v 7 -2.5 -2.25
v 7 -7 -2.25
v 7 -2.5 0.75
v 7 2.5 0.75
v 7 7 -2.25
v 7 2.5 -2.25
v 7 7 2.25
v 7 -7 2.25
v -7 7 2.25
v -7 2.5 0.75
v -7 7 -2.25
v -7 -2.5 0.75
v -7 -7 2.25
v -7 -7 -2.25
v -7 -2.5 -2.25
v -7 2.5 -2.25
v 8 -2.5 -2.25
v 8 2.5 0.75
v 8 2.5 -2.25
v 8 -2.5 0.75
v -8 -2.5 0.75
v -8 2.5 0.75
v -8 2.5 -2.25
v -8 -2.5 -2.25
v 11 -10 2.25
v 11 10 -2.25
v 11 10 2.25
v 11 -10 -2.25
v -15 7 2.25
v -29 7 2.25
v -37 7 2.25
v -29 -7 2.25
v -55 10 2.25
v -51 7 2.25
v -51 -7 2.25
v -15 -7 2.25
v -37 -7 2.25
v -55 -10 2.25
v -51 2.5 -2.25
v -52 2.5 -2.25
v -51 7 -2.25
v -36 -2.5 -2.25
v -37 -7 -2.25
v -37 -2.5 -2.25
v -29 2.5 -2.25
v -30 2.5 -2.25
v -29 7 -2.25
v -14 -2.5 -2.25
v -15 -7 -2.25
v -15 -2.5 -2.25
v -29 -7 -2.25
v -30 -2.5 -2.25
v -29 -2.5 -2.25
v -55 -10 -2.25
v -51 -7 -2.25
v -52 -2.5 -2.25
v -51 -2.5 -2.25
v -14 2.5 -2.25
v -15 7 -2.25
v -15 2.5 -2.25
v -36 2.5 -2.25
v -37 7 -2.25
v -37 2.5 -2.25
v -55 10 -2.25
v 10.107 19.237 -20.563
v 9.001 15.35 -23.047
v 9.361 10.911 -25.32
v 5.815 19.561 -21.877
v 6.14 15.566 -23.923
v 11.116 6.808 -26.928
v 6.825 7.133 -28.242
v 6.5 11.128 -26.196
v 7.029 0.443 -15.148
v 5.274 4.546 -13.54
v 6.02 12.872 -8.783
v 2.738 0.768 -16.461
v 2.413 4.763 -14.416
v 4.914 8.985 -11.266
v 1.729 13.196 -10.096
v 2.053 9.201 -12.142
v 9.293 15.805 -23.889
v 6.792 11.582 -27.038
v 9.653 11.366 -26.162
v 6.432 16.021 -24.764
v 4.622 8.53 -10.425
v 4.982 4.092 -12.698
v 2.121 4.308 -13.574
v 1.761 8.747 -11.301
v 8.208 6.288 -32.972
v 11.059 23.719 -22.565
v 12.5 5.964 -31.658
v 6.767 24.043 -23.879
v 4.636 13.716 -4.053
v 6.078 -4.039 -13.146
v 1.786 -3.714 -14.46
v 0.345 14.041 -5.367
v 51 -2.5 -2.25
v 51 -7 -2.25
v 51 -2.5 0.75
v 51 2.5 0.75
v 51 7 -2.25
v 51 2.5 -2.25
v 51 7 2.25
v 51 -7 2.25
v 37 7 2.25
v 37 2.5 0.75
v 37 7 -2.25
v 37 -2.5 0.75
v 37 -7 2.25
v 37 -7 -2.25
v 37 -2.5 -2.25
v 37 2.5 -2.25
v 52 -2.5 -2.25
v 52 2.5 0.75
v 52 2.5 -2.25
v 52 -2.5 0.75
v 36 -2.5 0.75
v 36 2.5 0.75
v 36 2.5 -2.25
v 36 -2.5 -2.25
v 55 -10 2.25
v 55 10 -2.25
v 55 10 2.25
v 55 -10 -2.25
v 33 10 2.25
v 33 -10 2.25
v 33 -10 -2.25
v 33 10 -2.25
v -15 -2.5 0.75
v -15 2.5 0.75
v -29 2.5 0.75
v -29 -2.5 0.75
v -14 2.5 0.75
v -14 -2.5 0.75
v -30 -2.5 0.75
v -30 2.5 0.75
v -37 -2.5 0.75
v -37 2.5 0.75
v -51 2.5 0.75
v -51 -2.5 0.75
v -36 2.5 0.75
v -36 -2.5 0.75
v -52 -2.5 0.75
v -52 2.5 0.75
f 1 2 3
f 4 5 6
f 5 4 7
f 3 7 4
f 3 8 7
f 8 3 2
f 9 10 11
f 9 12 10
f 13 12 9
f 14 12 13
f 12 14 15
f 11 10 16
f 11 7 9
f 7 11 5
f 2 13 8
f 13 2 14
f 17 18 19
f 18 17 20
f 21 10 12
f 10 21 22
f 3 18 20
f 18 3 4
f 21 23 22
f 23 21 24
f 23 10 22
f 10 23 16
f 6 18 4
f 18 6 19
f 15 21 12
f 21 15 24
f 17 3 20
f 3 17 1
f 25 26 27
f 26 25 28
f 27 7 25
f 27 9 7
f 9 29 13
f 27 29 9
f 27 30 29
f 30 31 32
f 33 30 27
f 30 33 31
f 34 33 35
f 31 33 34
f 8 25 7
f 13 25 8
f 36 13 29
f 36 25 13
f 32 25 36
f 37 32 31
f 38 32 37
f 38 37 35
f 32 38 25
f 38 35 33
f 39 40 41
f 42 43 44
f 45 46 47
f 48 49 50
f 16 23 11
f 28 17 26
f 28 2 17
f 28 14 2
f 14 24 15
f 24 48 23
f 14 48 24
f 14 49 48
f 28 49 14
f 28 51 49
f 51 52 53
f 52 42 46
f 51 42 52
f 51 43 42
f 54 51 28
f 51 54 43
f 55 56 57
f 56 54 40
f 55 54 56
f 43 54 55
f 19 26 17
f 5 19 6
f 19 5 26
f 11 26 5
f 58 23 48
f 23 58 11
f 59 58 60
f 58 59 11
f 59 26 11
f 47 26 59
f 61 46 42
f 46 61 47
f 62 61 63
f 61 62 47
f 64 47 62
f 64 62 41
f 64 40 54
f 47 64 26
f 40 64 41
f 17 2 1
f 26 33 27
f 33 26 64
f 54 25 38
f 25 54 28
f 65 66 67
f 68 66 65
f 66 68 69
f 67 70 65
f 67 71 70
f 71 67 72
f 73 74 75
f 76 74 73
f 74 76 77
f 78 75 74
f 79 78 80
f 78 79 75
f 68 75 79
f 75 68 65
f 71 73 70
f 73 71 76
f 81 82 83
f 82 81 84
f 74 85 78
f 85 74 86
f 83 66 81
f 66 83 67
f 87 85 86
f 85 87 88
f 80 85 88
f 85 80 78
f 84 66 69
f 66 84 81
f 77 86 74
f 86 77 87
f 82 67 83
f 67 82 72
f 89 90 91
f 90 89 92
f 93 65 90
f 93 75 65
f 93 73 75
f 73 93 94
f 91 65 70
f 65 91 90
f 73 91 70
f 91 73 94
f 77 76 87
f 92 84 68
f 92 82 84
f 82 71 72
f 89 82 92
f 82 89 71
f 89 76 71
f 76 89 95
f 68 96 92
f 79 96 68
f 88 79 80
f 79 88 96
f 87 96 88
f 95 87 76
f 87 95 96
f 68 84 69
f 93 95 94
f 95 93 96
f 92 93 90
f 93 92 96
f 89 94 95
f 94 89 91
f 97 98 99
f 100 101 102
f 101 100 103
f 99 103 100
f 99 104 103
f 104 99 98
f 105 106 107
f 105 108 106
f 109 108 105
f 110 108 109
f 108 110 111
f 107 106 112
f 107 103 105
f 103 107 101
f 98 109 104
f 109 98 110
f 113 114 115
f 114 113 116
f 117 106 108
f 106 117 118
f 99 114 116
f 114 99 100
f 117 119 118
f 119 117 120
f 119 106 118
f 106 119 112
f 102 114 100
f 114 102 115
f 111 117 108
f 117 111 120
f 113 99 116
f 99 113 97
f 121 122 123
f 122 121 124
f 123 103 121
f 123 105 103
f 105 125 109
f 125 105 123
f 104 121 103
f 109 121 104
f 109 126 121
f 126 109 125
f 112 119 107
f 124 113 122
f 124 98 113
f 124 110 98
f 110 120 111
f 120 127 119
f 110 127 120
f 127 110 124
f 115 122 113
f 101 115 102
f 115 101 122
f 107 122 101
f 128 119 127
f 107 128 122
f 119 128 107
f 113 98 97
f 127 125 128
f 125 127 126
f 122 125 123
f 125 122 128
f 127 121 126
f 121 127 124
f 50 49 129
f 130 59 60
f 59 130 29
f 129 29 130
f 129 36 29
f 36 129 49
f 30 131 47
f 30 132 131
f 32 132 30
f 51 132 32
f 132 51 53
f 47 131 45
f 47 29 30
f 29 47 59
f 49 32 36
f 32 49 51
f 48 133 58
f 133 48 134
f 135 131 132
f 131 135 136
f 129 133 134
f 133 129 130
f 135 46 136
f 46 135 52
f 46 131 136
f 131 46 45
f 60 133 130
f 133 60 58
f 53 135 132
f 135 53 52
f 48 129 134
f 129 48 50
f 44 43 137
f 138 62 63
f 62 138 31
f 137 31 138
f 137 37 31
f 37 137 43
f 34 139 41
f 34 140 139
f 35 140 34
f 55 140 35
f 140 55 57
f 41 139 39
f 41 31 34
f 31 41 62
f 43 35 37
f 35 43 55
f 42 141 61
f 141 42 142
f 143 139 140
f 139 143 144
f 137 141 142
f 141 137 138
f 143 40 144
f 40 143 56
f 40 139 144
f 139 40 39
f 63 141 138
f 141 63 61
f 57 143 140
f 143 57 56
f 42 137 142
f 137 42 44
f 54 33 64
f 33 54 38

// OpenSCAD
union () {
  difference () {
    cube ([22, 20, 4.5], center=true);
    union () {
      cube ([14, 14, 5], center=true);
      translate ([0, 0, -2.25]) {
        cube ([16, 5, 6], center=true);
      }
    }
  }
  rotate ([57.29577951308232,57.29577951308232,57.29577951308232]) {
    translate ([22, 0, 0]) {
      difference () {
        cube ([22, 20, 4.5], center=true);
        union () {
          cube ([14, 14, 5], center=true);
          translate ([0, 0, -2.25]) {
            cube ([16, 5, 6], center=true);
          }
        }
      }
    }
  }
  translate ([44, 0, 0]) {
    difference () {
      cube ([22, 20, 4.5], center=true);
      union () {
        cube ([14, 14, 5], center=true);
        translate ([0, 0, -2.25]) {
          cube ([16, 5, 6], center=true);
        }
      }
    }
  }
  translate ([-22, 0, 0]) {
    difference () {
      cube ([22, 20, 4.5], center=true);
      union () {
        cube ([14, 14, 5], center=true);
        translate ([0, 0, -2.25]) {
          cube ([16, 5, 6], center=true);
        }
      }
    }
  }
  translate ([-44, 0, 0]) {
    difference () {
      cube ([22, 20, 4.5], center=true);
      union () {
        cube ([14, 14, 5], center=true);
        translate ([0, 0, -2.25]) {
          cube ([16, 5, 6], center=true);
        }
      }
    }
  }
}
